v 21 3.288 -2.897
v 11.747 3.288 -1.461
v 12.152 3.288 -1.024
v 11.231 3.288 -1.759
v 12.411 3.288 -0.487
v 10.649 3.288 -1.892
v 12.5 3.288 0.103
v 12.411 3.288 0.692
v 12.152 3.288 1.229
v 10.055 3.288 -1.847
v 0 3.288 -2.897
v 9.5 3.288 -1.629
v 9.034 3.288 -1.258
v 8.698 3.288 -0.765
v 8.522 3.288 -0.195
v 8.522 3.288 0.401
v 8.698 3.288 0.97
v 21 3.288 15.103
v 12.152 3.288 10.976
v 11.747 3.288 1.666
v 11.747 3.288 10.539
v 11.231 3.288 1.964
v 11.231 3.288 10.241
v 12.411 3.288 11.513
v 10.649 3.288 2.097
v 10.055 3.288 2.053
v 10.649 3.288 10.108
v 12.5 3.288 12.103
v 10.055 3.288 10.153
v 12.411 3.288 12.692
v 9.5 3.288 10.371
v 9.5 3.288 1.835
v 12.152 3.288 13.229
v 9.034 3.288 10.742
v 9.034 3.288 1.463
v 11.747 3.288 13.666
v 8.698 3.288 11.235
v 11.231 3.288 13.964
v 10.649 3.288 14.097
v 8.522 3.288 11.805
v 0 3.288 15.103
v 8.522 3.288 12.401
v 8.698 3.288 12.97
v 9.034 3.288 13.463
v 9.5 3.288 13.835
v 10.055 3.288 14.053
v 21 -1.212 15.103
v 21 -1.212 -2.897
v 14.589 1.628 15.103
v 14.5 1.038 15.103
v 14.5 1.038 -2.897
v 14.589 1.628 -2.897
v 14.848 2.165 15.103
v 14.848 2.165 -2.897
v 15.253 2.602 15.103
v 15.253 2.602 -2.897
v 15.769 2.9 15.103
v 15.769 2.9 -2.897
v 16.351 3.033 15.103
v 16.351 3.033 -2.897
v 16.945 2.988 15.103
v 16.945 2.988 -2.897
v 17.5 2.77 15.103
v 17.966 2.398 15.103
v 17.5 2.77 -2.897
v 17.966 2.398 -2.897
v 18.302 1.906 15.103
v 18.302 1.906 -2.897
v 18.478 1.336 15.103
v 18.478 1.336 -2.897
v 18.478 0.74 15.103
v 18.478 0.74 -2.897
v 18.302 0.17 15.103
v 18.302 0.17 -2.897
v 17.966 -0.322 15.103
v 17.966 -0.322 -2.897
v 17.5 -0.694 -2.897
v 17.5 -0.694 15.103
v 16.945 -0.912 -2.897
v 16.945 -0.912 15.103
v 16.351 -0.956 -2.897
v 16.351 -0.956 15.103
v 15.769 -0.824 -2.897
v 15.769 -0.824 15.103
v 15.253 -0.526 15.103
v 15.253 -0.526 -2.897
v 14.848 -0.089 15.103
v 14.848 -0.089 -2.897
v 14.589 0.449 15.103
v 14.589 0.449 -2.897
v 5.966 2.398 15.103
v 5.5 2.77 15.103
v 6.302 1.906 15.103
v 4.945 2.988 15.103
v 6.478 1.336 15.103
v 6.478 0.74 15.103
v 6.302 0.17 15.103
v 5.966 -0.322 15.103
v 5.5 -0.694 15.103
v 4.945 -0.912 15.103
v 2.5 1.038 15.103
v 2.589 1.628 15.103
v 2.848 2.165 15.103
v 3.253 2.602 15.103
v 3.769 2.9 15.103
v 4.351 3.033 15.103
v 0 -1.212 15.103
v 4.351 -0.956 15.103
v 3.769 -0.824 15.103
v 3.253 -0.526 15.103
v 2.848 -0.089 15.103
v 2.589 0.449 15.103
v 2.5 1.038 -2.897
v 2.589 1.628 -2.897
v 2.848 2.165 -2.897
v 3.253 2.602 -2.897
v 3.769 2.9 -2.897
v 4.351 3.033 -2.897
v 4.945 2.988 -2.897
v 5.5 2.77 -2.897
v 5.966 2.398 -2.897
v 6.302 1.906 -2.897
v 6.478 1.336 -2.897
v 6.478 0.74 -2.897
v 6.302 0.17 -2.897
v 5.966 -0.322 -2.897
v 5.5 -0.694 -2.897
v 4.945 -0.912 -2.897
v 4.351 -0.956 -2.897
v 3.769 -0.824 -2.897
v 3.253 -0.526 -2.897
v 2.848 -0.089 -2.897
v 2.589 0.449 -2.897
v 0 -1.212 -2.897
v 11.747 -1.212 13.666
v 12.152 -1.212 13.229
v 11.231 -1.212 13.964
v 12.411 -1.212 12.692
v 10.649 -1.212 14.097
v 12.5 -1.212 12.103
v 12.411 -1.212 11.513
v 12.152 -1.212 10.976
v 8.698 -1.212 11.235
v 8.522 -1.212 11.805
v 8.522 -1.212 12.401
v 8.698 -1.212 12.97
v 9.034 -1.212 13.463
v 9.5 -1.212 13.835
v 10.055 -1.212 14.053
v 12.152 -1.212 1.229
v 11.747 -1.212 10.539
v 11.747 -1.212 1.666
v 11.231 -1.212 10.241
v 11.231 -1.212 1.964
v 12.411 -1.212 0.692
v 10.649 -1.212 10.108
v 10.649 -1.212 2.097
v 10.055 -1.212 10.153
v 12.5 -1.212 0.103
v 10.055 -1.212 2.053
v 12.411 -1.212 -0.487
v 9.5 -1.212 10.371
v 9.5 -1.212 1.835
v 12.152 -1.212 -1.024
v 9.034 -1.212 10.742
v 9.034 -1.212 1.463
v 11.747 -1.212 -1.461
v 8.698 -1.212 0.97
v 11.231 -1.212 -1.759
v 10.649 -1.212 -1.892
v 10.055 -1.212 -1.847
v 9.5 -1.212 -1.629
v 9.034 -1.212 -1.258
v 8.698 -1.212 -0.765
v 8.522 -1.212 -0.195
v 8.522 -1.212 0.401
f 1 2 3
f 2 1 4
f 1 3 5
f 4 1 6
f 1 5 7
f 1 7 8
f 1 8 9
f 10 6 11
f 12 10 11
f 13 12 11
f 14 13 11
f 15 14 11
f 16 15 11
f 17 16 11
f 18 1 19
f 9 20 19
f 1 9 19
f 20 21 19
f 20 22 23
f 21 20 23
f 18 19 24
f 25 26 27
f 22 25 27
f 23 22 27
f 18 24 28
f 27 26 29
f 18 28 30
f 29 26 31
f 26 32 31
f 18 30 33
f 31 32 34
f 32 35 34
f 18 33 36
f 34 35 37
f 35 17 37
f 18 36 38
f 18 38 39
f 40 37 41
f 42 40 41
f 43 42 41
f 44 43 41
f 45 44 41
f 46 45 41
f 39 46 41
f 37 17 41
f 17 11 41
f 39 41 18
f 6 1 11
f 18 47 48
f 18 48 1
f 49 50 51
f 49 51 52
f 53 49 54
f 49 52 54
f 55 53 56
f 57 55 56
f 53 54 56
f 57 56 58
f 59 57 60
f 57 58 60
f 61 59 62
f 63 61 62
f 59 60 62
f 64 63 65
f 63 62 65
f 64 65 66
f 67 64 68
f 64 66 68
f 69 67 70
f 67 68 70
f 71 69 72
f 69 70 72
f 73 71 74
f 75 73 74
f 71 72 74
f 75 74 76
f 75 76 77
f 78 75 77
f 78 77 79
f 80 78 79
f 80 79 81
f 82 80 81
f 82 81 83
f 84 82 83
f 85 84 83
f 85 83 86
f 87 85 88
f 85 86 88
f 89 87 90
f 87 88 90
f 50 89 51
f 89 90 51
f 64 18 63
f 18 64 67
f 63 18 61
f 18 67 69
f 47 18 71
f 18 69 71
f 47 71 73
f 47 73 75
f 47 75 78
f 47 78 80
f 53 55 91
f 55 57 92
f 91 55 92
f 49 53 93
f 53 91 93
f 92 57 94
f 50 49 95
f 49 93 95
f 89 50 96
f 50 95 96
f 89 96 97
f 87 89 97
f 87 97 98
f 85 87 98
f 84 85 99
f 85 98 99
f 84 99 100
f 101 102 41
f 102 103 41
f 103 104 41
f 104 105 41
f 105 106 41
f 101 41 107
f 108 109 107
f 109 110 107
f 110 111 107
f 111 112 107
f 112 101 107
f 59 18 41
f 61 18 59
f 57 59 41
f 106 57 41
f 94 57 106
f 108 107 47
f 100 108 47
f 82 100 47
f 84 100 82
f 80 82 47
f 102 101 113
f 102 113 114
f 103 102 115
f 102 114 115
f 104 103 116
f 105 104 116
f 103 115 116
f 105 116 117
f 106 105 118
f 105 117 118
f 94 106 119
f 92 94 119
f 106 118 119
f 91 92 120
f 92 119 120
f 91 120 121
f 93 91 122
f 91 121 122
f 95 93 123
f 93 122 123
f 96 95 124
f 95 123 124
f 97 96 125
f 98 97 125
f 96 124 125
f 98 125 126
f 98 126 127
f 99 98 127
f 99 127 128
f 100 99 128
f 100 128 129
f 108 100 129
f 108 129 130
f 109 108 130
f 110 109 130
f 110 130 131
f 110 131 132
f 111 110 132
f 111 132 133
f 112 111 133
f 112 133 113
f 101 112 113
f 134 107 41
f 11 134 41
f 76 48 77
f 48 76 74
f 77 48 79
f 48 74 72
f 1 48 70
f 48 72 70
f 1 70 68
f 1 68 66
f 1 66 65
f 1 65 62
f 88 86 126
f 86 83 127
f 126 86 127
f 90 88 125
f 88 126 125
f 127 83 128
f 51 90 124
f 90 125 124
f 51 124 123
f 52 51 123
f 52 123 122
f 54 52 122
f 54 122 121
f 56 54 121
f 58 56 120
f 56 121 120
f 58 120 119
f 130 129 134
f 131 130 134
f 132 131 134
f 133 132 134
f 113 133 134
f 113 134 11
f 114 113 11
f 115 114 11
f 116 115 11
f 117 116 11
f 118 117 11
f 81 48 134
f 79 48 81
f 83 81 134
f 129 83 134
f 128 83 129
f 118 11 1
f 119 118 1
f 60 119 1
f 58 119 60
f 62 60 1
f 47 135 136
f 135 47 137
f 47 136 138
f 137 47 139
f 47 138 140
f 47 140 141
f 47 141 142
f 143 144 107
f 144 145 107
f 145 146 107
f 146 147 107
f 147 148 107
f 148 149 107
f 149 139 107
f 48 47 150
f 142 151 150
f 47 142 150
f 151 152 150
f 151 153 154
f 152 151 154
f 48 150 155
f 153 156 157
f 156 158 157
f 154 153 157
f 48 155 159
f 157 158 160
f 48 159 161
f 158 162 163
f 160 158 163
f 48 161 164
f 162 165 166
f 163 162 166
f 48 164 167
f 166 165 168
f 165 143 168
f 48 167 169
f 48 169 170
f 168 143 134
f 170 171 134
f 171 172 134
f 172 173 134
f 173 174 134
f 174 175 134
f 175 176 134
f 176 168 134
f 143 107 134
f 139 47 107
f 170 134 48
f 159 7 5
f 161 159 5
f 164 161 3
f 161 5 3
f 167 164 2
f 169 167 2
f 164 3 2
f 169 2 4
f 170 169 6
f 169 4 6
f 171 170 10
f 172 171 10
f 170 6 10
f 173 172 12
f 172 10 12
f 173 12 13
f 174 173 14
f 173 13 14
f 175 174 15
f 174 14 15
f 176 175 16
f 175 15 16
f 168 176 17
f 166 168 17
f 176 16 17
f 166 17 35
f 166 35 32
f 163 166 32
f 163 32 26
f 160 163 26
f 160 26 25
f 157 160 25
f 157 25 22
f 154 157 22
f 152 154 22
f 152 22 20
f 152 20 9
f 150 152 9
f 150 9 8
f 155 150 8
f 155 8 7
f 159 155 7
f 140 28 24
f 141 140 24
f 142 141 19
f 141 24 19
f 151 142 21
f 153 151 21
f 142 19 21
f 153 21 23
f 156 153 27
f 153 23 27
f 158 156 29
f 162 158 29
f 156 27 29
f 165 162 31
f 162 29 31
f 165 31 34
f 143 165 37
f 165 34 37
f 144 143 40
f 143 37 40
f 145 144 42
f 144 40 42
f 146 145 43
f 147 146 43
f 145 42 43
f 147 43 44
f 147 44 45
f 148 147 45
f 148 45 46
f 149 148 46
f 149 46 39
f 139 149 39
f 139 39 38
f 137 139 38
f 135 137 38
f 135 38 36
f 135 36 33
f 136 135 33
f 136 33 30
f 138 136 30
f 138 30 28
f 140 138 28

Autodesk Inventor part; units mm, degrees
ref_plane "YZ Plane" through (0, 0, 0) normal (1, 0, 0) x (0, 1, 0)
ref_plane "XZ Plane" through (0, 0, 0) normal (0, 1, 0) x (-1, 0, 0)
ref_plane "XY Plane" through (0, 0, 0) normal (0, 0, 1) x (1, 0, 0)
sketch "Sketch1" plane through (0, 0, 0) normal (1, 0, 0) x (0, 1, 0)
  line L0 (3.2881, 15.1027) -> (-1.2119, 15.1027)
  line L1 (-1.2119, 15.1027) -> (-1.2119, -2.8973)
  line L2 (-1.2119, -2.8973) -> (3.2881, -2.8973)
  line L3 (3.2881, -2.8973) -> (3.2881, 15.1027)
  point P0 (0, 0)
  dimension "d0" = 4.5
  dimension "d1" = 18
extrude "Extrusion1" add sketch "Sketch1" along normal blind 21
sketch "Sketch2" plane through (0, 3.2881, 15.1027) normal (0, 1, 0) x (1, 0, 0)
  circle A0 centre (10.5, 3) radius 2
  circle A1 centre (10.5, 3) radius 2
  circle A2 centre (10.5, 15) radius 2
  line L0 (0, 18) -> (21, 18) projected
  line L1 (0, 0) -> (21, 0) projected
  line L2 (0, 18) -> (0, 0) projected
  point P0 (0, 15.1027)
  dimension "d4" = 18
  dimension "d5" = 12
  dimension "d6" = 3
  dimension "d7" = 10.5
  dimension "d8" = 21
  dimension "d9" = 10.5
sketch "Sketch3" plane through (0, -1.2119, -2.8973) normal (0, 0, -1) x (-1, 0, 0)
  circle A0 centre (-4.5, 2.25) radius 2
  circle A1 centre (-4.5, 2.25) radius 2
  circle A2 centre (-16.5, 2.25) radius 2
  line L0 (0, 4.5) -> (-21, 4.5) projected
  line L1 (0, 0) -> (0, 4.5) projected
  point P0 (0, 1.2119)
  dimension "d10" = 12
  dimension "d11" = 2.25
  dimension "d12" = 2.25
  dimension "d13" = 4.5
extrude "Extrusion2" cut sketch "Sketch2" against normal through all
extrude "Extrusion3" cut sketch "Sketch3" against normal through all
equation "\"d7\" = 0.5 * d8"
equation "\"d9\" = d7"
equation "\"d12\" = d11"
properties part number "XL_XL_interface_v2"
